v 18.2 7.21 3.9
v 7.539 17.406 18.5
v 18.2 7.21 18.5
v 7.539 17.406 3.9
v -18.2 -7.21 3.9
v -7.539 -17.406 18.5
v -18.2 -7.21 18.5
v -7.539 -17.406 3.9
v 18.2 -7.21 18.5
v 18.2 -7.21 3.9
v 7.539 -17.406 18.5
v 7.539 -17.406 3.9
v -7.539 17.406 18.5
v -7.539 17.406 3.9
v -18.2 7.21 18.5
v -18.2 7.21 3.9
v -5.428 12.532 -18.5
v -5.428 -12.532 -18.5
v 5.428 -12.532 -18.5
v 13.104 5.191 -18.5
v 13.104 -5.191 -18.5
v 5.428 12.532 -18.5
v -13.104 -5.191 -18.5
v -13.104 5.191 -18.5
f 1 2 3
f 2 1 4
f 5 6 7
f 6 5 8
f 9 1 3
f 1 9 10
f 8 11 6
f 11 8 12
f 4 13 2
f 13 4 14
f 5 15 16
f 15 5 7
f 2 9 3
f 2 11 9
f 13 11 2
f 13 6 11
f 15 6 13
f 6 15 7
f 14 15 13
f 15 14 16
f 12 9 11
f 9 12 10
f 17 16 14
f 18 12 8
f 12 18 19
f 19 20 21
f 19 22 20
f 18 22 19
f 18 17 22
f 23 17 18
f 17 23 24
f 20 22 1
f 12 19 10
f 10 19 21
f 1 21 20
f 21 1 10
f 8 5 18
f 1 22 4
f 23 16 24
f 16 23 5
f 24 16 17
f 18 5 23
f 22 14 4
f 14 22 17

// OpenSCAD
// Faceted truncated polyhedral solid (single connected piece)
// Bounding box target: 39.4 x 37.68 x 36.4 mm

bbox_X = 39.4;   //[19.7:78.8:0.01]
bbox_Y = 37.68;  //[18.84:75.36:0.01]
bbox_Z = 36.4;   //[18.2:72.8:0.01]

n_sides = 8;     //[6:16:1]

// Top (largest) polygon scale relative to bbox
top_scale_X = 1; //[0.8:1.2:0.01]
top_scale_Y = 1; //[0.8:1.2:0.01]

// Bottom (smallest) polygon scale relative to bbox
bottom_scale_X = 0.72; //[0.36:1.44:0.01]
bottom_scale_Y = 0.72; //[0.36:1.44:0.01]

// Height of near-vertical upper band (rest is tapered)
z_upper_wall = 14; //[7:28:0.1]

// Small overlap to guarantee watertight union
eps_overlap = 0.6; //[0.2:2:0.1]

function clamp(v, lo, hi) = v < lo ? lo : (v > hi ? hi : v);

// Regular n-gon points with independent X/Y scaling (ellipse-like scaling)
function ngon_pts(n, rx, ry, rot=0) =
    [ for (i = [0:n-1])
        [ rx * cos(rot + 360*i/n), ry * sin(rot + 360*i/n) ]
    ];

module truncated_faceted_solid() {
    // Derived dimensions
    z_upper = clamp(z_upper_wall, 0, bbox_Z);
    z_lower = bbox_Z - z_upper;

    rx_top = (bbox_X * top_scale_X) / 2;
    ry_top = (bbox_Y * top_scale_Y) / 2;

    rx_bot = (bbox_X * bottom_scale_X) / 2;
    ry_bot = (bbox_Y * bottom_scale_Y) / 2;

    // Slight rotation so front/back/left/right read as regular polygon silhouette
    rot = 180 / n_sides;

    union() {
        // Upper near-vertical band: straight extrusion of the top polygon
        translate([0, 0, bbox_Z/2 - z_upper/2])
            linear_extrude(height = z_upper + eps_overlap, center = true, convexity = 10)
                polygon(points = ngon_pts(n_sides, rx_top, ry_top, rot));

        // Lower tapered band: hull between a top polygon (at transition) and smaller bottom polygon
        hull() {
            // Transition ring (same as top polygon) at z = -bbox_Z/2 + z_lower
            translate([0, 0, -bbox_Z/2 + z_lower])
                linear_extrude(height = eps_overlap, center = true, convexity = 10)
                    polygon(points = ngon_pts(n_sides, rx_top, ry_top, rot));

            // Bottom polygon at z = -bbox_Z/2
            translate([0, 0, -bbox_Z/2])
                linear_extrude(height = eps_overlap, center = true, convexity = 10)
                    polygon(points = ngon_pts(n_sides, rx_bot, ry_bot, rot));
        }
    }
}

truncated_faceted_solid();
